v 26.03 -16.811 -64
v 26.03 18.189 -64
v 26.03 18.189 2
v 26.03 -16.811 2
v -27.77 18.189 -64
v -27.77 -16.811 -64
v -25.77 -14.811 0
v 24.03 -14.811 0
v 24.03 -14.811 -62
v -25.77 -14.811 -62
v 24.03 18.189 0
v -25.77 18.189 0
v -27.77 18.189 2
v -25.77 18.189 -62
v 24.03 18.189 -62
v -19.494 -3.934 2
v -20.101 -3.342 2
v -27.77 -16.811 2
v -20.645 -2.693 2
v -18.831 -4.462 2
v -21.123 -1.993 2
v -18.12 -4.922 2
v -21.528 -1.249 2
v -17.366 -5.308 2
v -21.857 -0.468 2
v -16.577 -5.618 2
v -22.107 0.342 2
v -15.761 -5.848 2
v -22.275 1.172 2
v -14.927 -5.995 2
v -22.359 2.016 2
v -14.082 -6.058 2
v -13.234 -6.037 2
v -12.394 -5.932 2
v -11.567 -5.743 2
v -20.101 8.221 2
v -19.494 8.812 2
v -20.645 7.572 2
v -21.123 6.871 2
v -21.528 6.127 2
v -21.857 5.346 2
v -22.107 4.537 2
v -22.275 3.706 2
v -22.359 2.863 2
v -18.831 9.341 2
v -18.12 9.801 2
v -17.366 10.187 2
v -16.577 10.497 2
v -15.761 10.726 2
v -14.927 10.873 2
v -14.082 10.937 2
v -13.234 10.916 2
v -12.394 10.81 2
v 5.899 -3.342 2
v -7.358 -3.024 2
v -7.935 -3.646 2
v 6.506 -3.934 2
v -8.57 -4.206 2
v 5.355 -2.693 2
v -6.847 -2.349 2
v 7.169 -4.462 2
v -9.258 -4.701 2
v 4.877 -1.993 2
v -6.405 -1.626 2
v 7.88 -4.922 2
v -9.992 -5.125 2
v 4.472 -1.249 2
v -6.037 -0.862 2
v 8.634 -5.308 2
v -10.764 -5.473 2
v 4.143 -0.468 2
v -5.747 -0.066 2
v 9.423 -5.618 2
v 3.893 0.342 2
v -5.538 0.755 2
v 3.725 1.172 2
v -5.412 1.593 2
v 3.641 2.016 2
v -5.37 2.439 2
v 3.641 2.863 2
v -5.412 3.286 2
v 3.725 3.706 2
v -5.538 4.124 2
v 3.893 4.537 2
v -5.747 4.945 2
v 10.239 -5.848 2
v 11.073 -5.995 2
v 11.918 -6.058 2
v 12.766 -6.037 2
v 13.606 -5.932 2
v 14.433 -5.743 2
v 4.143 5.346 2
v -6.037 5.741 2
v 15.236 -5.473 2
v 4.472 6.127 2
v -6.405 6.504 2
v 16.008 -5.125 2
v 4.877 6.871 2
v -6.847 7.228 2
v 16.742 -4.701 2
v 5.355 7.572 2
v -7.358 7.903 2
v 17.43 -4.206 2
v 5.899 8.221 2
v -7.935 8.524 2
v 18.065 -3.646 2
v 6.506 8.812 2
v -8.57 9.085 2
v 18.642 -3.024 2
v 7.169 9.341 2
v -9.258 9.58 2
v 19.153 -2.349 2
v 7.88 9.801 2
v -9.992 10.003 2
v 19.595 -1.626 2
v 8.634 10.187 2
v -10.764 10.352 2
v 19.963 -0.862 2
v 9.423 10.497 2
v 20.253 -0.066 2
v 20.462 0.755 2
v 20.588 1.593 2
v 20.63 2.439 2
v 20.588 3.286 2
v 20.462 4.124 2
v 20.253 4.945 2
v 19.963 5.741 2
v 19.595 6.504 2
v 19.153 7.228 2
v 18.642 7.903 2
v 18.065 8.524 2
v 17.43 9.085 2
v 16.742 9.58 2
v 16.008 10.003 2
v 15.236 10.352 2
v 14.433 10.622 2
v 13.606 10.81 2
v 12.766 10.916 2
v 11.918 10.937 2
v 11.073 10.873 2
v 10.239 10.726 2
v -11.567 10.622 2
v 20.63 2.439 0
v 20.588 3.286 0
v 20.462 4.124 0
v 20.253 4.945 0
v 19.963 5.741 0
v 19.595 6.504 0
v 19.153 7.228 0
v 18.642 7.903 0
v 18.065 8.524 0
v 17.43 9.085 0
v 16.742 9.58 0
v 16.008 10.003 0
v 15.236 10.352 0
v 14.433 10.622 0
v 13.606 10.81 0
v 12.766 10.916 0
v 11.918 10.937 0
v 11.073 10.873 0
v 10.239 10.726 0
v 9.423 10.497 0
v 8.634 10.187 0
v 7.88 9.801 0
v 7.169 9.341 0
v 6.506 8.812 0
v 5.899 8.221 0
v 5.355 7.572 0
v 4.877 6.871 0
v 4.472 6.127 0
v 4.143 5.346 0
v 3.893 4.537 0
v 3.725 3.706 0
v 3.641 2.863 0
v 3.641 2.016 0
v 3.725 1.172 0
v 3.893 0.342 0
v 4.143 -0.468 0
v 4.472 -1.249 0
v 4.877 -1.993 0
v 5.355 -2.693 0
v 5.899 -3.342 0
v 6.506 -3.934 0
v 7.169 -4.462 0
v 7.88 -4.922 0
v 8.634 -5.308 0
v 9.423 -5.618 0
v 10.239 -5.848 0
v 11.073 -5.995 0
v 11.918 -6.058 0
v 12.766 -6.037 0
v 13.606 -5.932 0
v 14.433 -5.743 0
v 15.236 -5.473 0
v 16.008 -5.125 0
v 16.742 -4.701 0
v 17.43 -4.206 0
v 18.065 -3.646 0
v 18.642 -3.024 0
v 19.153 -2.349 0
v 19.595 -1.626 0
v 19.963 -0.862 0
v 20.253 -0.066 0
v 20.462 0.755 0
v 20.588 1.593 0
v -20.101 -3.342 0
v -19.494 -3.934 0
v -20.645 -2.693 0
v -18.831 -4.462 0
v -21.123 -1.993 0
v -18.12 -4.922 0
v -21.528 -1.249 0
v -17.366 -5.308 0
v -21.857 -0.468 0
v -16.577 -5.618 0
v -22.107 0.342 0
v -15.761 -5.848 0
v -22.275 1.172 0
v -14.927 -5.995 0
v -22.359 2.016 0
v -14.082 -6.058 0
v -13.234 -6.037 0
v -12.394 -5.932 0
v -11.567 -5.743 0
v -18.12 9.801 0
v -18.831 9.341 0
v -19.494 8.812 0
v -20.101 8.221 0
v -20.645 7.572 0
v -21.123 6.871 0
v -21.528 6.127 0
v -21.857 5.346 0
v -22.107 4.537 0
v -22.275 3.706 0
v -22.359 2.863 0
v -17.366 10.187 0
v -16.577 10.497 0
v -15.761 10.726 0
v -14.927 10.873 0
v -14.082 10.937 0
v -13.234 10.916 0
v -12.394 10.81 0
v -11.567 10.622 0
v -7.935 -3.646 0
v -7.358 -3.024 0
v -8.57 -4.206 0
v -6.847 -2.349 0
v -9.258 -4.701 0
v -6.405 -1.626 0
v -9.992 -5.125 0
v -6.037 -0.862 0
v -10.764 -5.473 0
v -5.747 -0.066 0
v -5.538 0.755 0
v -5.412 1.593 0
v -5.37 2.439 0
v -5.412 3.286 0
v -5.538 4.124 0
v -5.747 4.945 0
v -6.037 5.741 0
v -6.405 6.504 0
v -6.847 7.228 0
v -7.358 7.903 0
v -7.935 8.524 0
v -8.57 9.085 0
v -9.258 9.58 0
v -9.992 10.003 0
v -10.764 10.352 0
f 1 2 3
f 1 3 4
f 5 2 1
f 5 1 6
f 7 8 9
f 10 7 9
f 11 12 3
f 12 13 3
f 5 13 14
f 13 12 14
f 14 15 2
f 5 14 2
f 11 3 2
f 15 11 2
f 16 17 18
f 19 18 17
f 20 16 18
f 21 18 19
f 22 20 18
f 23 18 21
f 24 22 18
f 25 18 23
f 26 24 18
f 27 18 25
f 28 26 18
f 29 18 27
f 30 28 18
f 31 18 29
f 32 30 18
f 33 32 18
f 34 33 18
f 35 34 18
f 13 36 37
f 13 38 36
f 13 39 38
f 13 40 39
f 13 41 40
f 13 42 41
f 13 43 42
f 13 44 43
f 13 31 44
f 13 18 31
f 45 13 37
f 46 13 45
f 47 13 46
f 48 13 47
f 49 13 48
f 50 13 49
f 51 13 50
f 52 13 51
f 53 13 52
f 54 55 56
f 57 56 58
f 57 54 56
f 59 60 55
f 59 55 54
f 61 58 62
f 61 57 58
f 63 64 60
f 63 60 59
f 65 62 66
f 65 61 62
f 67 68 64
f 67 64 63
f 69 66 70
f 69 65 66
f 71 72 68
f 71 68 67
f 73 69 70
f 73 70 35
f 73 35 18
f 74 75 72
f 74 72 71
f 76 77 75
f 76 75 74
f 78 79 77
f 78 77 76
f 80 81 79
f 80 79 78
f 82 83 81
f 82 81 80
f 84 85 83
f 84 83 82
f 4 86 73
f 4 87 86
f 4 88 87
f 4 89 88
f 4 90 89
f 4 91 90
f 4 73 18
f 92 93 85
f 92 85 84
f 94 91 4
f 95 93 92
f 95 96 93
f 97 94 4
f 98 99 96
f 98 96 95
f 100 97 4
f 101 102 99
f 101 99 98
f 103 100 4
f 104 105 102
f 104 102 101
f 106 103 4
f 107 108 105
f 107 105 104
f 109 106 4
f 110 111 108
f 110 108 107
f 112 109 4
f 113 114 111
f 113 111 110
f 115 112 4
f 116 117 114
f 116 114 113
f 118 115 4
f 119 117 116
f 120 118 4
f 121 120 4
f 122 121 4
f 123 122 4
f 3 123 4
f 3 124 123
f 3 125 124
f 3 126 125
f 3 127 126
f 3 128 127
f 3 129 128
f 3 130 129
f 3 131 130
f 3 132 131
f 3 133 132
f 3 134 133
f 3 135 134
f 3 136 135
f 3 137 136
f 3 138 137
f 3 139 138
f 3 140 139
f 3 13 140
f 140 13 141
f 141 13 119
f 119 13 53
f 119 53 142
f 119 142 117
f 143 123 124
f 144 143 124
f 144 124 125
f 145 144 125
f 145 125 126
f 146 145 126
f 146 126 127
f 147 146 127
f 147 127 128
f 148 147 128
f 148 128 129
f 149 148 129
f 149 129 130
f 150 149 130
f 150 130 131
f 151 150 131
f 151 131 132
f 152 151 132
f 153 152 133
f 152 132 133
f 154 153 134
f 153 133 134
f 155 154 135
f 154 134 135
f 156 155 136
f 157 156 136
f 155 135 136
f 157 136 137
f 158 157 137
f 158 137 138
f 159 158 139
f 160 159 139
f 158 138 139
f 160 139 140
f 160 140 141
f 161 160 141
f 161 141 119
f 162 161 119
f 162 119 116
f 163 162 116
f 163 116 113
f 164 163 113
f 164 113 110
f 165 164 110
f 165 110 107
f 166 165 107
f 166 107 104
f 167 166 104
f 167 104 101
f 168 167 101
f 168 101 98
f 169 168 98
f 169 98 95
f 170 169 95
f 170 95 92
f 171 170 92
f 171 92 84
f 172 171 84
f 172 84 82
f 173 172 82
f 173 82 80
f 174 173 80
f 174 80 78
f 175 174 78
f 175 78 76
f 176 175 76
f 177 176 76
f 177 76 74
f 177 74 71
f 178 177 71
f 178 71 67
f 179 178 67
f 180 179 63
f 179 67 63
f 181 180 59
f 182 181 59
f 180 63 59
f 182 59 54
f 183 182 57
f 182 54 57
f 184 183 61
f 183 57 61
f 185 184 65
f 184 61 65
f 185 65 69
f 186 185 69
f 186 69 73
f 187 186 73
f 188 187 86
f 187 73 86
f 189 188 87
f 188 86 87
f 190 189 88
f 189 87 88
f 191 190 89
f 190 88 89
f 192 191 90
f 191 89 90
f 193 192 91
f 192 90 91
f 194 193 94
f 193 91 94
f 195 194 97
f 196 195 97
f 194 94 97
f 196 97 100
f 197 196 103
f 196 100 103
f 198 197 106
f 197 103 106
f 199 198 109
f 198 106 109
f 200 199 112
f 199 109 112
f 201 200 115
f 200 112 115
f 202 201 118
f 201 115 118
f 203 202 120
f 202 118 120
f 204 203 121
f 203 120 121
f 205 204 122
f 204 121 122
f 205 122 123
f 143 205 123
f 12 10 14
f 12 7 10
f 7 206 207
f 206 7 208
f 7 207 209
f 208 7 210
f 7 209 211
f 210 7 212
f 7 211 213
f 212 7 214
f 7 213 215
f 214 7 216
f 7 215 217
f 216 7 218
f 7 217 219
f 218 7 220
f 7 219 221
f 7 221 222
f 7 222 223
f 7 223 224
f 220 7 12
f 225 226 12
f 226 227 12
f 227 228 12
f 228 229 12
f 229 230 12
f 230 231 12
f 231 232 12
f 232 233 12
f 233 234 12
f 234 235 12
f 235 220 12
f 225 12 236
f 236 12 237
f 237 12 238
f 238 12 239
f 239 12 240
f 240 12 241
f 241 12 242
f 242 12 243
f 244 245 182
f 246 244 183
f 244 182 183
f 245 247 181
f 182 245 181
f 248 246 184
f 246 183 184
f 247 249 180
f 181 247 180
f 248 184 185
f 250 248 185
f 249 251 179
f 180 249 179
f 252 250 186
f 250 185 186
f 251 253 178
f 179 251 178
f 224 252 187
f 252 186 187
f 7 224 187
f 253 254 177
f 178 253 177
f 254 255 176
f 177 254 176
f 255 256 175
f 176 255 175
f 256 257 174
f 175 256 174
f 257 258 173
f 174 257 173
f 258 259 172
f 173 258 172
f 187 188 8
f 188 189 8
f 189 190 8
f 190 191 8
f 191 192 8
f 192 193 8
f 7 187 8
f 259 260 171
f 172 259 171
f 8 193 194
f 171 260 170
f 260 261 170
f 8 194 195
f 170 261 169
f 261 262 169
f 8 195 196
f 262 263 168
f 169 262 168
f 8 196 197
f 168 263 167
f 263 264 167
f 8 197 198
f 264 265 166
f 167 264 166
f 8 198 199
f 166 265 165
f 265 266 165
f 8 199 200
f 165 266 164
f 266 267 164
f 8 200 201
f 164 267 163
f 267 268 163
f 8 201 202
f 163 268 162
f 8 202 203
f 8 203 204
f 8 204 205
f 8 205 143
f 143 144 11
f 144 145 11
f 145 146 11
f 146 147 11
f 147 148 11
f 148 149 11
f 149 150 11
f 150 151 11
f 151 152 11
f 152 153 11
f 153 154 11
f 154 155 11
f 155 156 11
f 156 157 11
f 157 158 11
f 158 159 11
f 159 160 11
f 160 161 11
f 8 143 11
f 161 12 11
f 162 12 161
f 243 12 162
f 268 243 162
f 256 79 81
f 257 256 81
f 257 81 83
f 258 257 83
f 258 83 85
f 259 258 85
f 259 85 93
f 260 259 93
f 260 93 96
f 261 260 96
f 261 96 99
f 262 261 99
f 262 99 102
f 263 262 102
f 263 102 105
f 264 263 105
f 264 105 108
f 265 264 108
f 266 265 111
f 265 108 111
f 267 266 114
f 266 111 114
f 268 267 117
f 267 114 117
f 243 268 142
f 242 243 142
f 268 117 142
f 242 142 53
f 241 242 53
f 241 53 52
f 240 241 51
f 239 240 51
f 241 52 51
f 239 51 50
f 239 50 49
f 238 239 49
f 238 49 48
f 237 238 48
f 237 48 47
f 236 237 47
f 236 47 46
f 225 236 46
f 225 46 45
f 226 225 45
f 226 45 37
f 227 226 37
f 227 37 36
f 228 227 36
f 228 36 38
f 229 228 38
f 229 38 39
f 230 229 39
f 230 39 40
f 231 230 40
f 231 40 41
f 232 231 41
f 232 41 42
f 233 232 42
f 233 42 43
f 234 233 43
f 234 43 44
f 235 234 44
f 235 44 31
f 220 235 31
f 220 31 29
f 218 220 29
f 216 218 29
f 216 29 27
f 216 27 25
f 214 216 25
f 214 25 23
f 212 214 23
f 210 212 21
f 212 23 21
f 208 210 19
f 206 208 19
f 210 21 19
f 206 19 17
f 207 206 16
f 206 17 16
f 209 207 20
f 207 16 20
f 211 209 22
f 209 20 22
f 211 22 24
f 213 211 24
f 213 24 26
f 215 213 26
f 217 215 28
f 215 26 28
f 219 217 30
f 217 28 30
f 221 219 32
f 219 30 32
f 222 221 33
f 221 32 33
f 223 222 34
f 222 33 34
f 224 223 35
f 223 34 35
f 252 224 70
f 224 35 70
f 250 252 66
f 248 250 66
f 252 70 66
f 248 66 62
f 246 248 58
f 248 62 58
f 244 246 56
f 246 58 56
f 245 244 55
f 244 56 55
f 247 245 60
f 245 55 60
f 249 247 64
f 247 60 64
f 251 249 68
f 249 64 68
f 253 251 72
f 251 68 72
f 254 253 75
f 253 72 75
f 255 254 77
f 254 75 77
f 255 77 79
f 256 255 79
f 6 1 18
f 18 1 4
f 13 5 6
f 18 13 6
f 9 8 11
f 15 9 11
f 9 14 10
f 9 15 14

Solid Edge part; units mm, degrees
sketch "Sketch1" plane through (0, 0, 0) normal (0, 0, 1) x (1, 0, 0)
  line L0 (-23.7696, -8.3107) -> (22.0304, -8.3107)
  line L1 (22.0304, -8.3107) -> (22.0304, 13.1893)
  line L2 (22.0304, 13.1893) -> (-23.7696, 13.1893)
  line L3 (-23.7696, 13.1893) -> (-23.7696, -8.3107)
extrude "Protrusion1" add sketch "Sketch1" along normal blind 2
sketch "Sketch2" plane through (-0.8696, 2.4393, 2) normal (0, 0, 1) x (1, 0, 0)
  circle A0 centre (-13, 0) radius 8.5
  circle A1 centre (13, 0) radius 8.5
extrude "ExtrudedCutout_1" cut sketch "Sketch2" against normal blind 110.6455
sketch "Sketch3" plane through (-0.8696, 2.4393, 2) normal (0, 0, 1) x (1, 0, 0)
  line L0 (-22.9, 10.75) -> (-24.9, 10.75)
  line L1 (-24.9, 10.75) -> (-24.9, -10.75)
  line L2 (-24.9, -10.75) -> (-22.9, -10.75)
  line L3 (-22.9, -10.75) -> (-22.9, 10.75)
  line L4 (22.9, 10.75) -> (24.9, 10.75)
  line L5 (24.9, 10.75) -> (24.9, -10.75)
  line L6 (24.9, -10.75) -> (22.9, -10.75)
  line L7 (22.9, -10.75) -> (22.9, 10.75)
extrude "ExtrudedProtrusion_2" add sketch "Sketch3" against normal blind 2
sketch "Sketch4" plane through (-0.8696, 2.4393, 2) normal (0, 0, 1) x (1, 0, 0)
  line L0 (-24.9, 10.75) -> (-26.9, 10.75)
  line L1 (-26.9, 10.75) -> (-26.9, -10.75)
  line L2 (-26.9, -10.75) -> (-24.9, -10.75)
  line L3 (-24.9, -10.75) -> (-24.9, 10.75)
  line L4 (24.9, 10.75) -> (26.9, 10.75)
  line L5 (26.9, 10.75) -> (26.9, -10.75)
  line L6 (26.9, -10.75) -> (24.9, -10.75)
  line L7 (24.9, -10.75) -> (24.9, 10.75)
extrude "ExtrudedProtrusion_4" add sketch "Sketch4" against normal blind 66
sketch "Sketch5" plane through (24.0304, 2.4393, -32) normal (-1, 0, 0) x (0, 0, 1)
  line L0 (-32, 10.75) -> (-30, 10.75)
  line L1 (-30, 10.75) -> (-30, -10.75)
  line L2 (-30, -10.75) -> (-32, -10.75)
  line L3 (-32, -10.75) -> (-32, 10.75)
extrude "ExtrudedProtrusion_5" add sketch "Sketch5" along normal blind 49.8416
sketch "Sketch6" plane through (-0.8696, -8.3107, -31) normal (0, -1, 0) x (-1, 0, 0)
  line L0 (-26.9, 33) -> (26.9, 33)
  line L1 (26.9, 33) -> (26.9, -32.0416)
  line L2 (26.9, -33) -> (26.9, -32.0416)
  line L3 (-26.9, -33) -> (26.9, -33)
  line L4 (-26.9, -33) -> (-26.9, 33)
extrude "ExtrudedProtrusion_6" add sketch "Sketch6" along normal blind 8.5
sketch "Sketch7" plane through (-0.8696, -8.3107, -31) normal (0, 1, 0) x (1, 0, 0)
  line L0 (-24.9, 31) -> (24.9, 31)
  line L1 (24.9, 31) -> (24.9, -31)
  line L2 (24.9, -31) -> (-24.9, -31)
  line L3 (-24.9, -31) -> (-24.9, 31)
extrude "ExtrudedCutout_2" cut sketch "Sketch7" against normal blind 6.5
sketch "Sketch8" plane through (-0.8696, 13.1893, -31) normal (0, 1, 0) x (0, 0, 1)
  line L0 (-33, 26.9) -> (33, 26.9)
  line L1 (33, 26.9) -> (33, -26.9)
  line L2 (33, -26.9) -> (-33, -26.9)
  line L3 (-33, -26.9) -> (-33, 26.9)
extrude "ExtrudedProtrusion_7" add sketch "Sketch8" along normal blind 5
sketch "Sketch9" plane through (-0.8696, 18.1893, -31) normal (0, 1, 0) x (0, 0, 1)
  line L0 (-31, 24.9) -> (31, 24.9)
  line L1 (31, 24.9) -> (31, -24.9)
  line L2 (31, -24.9) -> (-31, -24.9)
  line L3 (-31, -24.9) -> (-31, 24.9)
extrude "ExtrudedCutout_3" cut sketch "Sketch9" against normal blind 33
